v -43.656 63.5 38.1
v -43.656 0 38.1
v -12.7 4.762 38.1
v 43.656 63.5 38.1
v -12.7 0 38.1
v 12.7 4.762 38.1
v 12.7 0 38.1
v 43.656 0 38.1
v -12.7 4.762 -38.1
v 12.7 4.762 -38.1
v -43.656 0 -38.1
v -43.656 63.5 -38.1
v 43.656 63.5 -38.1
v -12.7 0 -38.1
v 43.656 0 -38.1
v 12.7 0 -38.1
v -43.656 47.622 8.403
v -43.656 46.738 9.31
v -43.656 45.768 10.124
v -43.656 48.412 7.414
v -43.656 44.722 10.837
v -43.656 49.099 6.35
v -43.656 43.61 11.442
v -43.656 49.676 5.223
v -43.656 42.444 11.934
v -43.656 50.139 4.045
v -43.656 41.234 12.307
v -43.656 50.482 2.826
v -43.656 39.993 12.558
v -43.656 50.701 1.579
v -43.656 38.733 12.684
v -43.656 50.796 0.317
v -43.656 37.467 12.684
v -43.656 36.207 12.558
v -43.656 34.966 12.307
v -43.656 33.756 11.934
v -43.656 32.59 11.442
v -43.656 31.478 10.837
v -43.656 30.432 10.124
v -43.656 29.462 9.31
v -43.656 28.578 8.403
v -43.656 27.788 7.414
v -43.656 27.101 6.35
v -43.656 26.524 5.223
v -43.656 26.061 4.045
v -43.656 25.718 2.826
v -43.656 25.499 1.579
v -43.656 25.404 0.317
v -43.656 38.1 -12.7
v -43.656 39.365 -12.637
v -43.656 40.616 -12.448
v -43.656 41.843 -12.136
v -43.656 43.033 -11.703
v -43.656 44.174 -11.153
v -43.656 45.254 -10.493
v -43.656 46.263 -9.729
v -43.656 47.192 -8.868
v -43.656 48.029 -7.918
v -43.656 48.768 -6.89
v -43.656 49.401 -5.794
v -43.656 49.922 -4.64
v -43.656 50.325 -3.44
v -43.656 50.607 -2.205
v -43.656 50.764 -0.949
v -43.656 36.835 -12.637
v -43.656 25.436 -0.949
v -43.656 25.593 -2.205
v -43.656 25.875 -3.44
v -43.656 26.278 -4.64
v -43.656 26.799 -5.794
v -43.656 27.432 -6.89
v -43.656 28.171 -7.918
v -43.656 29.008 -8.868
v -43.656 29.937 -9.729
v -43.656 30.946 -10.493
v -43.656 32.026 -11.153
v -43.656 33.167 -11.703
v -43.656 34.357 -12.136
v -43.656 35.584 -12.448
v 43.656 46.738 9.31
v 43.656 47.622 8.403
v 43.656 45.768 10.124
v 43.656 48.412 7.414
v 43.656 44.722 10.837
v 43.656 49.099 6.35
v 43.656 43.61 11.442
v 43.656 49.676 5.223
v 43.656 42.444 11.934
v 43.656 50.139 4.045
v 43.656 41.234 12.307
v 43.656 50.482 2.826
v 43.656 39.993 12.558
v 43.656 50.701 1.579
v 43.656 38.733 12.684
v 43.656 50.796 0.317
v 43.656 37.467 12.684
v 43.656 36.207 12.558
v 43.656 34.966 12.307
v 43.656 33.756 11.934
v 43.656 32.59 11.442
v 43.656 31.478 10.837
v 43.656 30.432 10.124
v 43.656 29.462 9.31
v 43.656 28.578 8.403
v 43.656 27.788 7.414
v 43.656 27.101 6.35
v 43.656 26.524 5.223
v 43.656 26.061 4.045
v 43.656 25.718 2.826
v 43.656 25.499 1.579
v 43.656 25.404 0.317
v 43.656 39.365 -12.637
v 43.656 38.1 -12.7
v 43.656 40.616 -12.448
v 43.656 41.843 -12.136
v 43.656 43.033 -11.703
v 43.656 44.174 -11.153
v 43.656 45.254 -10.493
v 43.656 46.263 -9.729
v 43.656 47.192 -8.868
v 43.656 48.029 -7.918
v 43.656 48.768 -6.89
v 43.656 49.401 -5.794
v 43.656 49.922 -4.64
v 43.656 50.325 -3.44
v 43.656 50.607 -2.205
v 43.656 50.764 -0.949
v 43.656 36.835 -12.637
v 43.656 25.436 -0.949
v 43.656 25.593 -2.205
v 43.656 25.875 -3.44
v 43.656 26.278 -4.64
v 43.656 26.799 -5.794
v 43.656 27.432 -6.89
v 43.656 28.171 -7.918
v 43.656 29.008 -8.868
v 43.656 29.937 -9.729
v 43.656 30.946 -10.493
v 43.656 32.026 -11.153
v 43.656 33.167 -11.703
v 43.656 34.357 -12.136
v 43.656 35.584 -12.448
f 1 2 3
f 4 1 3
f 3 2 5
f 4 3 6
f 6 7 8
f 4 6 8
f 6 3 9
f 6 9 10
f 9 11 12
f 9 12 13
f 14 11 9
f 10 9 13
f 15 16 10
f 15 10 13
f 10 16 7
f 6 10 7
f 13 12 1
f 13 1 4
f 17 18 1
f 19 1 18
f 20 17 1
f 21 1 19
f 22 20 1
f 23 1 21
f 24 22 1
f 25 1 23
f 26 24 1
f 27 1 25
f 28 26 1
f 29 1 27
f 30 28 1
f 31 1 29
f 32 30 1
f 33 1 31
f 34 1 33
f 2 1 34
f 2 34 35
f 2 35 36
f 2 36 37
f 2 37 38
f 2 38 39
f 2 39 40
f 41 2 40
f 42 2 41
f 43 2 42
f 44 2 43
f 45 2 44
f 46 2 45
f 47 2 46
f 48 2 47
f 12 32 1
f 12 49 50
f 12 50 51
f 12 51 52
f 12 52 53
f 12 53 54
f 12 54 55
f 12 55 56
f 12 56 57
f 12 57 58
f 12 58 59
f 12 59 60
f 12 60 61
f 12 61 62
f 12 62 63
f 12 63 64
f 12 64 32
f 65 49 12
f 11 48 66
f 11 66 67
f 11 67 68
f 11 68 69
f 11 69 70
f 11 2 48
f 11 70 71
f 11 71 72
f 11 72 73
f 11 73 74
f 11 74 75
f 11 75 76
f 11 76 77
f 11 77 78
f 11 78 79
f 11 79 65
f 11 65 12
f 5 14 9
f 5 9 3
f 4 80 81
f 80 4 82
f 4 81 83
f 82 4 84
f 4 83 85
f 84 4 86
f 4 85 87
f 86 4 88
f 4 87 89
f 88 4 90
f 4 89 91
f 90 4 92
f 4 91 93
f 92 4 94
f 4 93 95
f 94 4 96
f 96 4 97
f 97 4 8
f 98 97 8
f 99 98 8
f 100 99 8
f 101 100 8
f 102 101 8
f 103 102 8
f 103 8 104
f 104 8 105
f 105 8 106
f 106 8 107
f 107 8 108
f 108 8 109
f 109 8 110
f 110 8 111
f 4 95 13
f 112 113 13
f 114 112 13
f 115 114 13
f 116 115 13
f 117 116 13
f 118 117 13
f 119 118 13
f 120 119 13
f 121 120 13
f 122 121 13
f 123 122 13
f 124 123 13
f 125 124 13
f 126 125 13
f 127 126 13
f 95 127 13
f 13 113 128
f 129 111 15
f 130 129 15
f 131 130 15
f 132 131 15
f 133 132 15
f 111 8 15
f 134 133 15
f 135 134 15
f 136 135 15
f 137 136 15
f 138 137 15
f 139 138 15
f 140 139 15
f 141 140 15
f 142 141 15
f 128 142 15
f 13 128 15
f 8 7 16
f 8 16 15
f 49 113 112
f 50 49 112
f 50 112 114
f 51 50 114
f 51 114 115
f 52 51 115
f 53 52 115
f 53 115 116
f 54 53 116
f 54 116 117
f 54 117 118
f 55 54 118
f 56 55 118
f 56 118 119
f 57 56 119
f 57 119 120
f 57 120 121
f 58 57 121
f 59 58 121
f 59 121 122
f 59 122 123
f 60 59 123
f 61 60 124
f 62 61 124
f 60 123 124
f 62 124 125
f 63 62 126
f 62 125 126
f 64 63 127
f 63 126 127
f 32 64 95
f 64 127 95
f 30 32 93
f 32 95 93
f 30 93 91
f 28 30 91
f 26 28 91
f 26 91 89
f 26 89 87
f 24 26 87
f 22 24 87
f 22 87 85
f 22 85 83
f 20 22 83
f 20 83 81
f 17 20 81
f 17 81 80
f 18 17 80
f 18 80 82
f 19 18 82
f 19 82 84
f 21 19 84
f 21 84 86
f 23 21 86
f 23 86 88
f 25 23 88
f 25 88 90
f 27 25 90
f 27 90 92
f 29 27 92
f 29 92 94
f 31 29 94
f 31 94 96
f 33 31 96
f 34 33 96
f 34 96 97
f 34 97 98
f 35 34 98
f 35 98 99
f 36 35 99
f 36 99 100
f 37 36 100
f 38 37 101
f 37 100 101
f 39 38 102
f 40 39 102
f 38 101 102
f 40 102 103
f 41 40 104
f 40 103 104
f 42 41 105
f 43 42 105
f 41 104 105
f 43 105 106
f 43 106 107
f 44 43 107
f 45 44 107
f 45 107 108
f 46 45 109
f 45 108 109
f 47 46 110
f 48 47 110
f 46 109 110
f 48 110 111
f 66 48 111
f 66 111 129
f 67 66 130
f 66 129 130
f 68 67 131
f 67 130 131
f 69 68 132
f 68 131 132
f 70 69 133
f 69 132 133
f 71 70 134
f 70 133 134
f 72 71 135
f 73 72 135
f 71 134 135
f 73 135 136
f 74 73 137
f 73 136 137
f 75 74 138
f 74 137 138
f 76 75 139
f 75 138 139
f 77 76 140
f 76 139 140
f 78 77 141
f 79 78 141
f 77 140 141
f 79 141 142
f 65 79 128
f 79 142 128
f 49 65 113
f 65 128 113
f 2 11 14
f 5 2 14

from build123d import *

# Parameters (mm, degrees)
SKETCH1_W           = 87.3125
SKETCH1_H           = 76.2
BOSS_EXTRUDE1_DEPTH = 63.5
SKETCH2_W           = 25.4
SKETCH2_H           = 76.2
CUT_EXTRUDE1_DEPTH  = 4.7625
SKETCH3_R           = 12.7
CUT_EXTRUDE2_DEPTH  = 88.3125


with BuildPart() as part:
    # Sketch1 → Boss-Extrude1 (new body)
    with BuildSketch(Plane(origin=(0, 0, 0), x_dir=(1, 0, 0), z_dir=(0, 1, 0))):
        Rectangle(SKETCH1_W, SKETCH1_H)
    extrude(amount=BOSS_EXTRUDE1_DEPTH)

    # Sketch2 → Cut-Extrude1 (cut)
    with BuildSketch(Plane.XZ):
        Rectangle(SKETCH2_W, SKETCH2_H)
    extrude(amount=-CUT_EXTRUDE1_DEPTH, mode=Mode.SUBTRACT)

    # Sketch3 → Cut-Extrude2 (cut, through all)
    with BuildSketch(Plane(origin=(43.65625, 0, 0), x_dir=(0, 0, -1), z_dir=(1, 0, 0))):
        with Locations((0, 38.1)):
            Circle(SKETCH3_R)
    extrude(amount=-CUT_EXTRUDE2_DEPTH, mode=Mode.SUBTRACT)


solid = part.part
